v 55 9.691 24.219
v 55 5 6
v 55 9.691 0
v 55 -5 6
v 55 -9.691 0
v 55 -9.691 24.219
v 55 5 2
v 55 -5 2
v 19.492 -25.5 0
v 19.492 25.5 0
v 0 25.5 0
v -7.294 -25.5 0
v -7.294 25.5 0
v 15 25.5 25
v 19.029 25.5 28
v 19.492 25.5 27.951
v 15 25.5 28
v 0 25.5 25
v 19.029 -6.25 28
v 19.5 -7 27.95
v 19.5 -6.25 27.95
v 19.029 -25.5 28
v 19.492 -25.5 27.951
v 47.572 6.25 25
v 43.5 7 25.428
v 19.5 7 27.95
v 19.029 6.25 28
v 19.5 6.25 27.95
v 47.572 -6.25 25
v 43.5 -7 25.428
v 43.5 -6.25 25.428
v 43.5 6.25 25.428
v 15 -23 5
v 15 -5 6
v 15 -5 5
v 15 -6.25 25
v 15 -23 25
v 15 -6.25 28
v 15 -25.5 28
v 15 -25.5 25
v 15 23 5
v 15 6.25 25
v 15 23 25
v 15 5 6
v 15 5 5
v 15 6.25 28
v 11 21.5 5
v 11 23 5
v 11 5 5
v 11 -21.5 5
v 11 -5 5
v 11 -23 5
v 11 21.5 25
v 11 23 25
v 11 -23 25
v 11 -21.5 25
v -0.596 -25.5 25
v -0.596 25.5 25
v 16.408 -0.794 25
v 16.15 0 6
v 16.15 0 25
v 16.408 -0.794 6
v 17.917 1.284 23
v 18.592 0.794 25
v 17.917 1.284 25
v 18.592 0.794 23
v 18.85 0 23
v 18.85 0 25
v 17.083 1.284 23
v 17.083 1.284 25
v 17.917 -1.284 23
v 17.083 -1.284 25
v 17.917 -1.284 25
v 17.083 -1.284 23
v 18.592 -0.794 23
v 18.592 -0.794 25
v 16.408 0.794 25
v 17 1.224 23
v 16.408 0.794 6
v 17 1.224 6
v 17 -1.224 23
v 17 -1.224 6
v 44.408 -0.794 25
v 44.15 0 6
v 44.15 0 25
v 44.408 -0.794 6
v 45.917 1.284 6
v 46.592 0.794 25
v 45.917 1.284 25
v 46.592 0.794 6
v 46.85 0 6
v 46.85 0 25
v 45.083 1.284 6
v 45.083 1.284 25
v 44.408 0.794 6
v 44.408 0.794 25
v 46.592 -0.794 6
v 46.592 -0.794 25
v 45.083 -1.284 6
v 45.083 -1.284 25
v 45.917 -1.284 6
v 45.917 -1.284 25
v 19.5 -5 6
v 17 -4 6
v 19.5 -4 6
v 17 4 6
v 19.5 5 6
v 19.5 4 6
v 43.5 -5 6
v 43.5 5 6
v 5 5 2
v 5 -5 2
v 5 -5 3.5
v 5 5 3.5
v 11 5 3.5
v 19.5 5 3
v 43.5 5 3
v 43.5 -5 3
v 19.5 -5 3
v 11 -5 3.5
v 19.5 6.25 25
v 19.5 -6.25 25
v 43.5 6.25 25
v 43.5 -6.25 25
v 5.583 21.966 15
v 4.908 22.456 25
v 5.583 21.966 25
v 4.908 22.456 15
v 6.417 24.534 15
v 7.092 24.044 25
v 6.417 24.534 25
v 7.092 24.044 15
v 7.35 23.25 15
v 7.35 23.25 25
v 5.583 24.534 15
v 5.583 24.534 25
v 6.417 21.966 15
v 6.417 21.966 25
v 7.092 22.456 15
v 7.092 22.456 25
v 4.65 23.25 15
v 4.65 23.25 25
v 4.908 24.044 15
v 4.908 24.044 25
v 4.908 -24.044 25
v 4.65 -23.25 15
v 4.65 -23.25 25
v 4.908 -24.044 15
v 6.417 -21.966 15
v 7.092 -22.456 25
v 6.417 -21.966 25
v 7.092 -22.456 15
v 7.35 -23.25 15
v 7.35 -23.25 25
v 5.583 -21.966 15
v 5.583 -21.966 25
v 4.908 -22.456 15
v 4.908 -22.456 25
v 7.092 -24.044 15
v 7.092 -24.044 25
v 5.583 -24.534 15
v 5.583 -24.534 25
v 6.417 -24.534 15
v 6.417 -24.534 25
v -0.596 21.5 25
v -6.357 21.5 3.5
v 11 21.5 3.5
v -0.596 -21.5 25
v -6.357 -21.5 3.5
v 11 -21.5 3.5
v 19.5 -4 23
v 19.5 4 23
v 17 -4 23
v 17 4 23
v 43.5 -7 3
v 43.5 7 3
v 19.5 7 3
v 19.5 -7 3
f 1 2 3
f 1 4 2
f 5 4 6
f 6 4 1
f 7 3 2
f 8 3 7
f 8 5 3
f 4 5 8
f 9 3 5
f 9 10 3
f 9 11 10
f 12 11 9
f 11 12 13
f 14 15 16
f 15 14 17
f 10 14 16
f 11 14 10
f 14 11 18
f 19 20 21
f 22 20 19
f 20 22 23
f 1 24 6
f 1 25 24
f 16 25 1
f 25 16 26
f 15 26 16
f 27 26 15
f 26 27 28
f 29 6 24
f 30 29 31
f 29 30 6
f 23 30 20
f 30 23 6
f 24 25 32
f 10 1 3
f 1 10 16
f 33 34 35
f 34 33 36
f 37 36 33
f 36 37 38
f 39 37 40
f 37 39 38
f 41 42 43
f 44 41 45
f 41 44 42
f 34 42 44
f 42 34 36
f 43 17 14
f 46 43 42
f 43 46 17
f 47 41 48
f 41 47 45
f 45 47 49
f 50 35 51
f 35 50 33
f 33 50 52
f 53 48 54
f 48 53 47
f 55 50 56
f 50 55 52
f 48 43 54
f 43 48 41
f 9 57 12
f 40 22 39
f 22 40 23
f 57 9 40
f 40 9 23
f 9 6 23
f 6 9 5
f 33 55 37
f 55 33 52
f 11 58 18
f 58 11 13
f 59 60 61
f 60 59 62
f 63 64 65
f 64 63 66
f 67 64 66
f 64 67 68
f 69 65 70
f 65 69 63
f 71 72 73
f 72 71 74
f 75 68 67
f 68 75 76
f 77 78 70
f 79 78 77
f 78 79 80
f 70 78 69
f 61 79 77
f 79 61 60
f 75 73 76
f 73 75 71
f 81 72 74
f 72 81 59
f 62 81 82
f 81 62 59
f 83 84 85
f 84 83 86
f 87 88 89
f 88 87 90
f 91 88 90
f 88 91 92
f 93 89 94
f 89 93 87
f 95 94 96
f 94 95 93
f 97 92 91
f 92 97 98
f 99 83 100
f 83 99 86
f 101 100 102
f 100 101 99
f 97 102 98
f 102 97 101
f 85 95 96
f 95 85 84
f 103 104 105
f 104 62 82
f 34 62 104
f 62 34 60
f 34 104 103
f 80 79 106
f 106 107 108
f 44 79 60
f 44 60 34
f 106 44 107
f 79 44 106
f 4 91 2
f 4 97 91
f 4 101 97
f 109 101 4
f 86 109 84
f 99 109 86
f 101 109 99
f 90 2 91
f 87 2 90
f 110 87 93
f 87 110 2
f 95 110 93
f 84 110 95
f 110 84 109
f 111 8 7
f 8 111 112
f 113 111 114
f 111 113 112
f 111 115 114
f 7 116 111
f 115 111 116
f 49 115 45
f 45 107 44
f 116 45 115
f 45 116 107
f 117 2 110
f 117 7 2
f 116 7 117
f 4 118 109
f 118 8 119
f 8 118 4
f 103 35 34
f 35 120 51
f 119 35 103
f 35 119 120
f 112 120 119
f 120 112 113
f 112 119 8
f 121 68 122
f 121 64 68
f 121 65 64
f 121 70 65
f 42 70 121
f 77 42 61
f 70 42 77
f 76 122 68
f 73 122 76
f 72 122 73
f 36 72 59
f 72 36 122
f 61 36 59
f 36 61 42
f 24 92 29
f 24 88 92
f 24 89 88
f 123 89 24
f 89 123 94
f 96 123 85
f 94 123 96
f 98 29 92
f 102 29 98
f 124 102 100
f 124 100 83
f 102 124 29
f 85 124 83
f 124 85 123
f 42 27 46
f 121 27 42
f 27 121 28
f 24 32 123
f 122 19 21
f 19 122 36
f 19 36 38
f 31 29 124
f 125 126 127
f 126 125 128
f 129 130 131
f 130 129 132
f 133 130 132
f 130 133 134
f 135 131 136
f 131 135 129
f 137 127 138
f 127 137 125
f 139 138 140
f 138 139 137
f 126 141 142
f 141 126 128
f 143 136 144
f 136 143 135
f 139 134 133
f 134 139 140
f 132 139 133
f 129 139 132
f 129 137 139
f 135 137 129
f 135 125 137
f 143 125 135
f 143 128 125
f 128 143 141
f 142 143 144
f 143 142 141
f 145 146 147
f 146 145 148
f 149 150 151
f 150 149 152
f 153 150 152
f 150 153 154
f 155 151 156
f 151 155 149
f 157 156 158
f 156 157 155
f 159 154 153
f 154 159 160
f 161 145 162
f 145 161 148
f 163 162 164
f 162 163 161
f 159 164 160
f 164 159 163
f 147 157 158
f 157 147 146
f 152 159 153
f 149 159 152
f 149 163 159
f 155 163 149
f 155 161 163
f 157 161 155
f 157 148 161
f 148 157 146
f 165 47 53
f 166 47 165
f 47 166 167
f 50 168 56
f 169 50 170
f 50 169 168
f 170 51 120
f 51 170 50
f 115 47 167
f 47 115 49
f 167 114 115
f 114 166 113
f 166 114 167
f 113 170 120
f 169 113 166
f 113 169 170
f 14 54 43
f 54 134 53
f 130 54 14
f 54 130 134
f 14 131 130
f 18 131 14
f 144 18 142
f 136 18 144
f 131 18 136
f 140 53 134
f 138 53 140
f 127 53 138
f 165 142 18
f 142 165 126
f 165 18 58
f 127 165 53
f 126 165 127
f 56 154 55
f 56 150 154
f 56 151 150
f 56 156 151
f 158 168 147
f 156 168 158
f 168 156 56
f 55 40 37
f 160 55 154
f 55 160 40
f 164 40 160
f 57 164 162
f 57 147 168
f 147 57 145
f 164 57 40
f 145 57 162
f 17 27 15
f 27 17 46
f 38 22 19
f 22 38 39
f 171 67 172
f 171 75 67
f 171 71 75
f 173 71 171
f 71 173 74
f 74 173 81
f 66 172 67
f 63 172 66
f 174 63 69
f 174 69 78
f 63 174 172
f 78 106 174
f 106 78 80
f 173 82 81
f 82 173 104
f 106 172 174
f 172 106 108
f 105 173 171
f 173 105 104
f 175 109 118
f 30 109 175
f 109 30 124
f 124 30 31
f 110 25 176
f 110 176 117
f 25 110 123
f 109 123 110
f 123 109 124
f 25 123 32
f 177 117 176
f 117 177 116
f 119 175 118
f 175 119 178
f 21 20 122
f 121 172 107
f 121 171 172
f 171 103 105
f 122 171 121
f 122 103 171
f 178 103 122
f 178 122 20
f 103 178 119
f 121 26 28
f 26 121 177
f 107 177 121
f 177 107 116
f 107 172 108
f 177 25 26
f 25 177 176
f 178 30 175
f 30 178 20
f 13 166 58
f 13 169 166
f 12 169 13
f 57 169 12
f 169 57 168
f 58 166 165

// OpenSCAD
module mediaCabeza(){
	translate([0,0,30]) mirror([0,0,1]) difference(){	
		translate([0,-27.5,0]){ difference(){
			cube([55,53,30]);
			rotate([0,-6,0]) translate([0,0,-30]) cube([60,60,30]);
			translate([15,55,0]){rotate([0,0,-24]){cube([100,30,30]);}}}
		}
		translate([0,-60,0])cube([60,60,60]);
		translate([11,0,0])cube([4,23,25]); //Ranura para US
		translate([11,0,22])cube([4,20,3]);} //Ranura para componentes US
}


largoTornillos=28;

difference(){
	union(){
		translate([0,-0.000000000000000000000000001,0]) mediaCabeza();
//Esto ultimo es una chapuza para poder exportar el archivo.
		mirror([0,1,0]) mediaCabeza();
		translate([-20,-25.5,0])cube([20,51,26]);
	}
	translate([5,-5,2]){cube([80,10,4]);} //Canal para cableado
	translate([17.5,0,3])union(){ //tornillos
		cylinder(r=1.35,h=25,$fn=10);
		translate([largoTornillos,0,0])cylinder(r=1.35,h=25,$fn=10);
	}
	translate([15,-12.5/2,25])cube([33,12.5,25.6]); //pestañas del servo
	translate([6,23.25,15])cylinder(r=1.35,h=20, $fn=10);
	translate([6,-23.25,15])cylinder(r=1.35,h=20, $fn=10);
	translate([-10,-43/2,5])cube([25,43,50]);//US HUECOS
	translate([-14,-43/2,3.5])cube([25,43,50]); //US huecos
	translate([-5,-26,25])cube([20,52,40]);//altura delantera
	translate([0,-80,28])cube([80,160,40]);//altura total
	translate([17,-4,3])cube([5,8,20]); //cables montaje servo
	translate([19.5,-7,3])cube([24,14,30]); //montaje servo
	translate([-28,-40,0])rotate([0,15,0])cube([20,80,60]); //cara
}
